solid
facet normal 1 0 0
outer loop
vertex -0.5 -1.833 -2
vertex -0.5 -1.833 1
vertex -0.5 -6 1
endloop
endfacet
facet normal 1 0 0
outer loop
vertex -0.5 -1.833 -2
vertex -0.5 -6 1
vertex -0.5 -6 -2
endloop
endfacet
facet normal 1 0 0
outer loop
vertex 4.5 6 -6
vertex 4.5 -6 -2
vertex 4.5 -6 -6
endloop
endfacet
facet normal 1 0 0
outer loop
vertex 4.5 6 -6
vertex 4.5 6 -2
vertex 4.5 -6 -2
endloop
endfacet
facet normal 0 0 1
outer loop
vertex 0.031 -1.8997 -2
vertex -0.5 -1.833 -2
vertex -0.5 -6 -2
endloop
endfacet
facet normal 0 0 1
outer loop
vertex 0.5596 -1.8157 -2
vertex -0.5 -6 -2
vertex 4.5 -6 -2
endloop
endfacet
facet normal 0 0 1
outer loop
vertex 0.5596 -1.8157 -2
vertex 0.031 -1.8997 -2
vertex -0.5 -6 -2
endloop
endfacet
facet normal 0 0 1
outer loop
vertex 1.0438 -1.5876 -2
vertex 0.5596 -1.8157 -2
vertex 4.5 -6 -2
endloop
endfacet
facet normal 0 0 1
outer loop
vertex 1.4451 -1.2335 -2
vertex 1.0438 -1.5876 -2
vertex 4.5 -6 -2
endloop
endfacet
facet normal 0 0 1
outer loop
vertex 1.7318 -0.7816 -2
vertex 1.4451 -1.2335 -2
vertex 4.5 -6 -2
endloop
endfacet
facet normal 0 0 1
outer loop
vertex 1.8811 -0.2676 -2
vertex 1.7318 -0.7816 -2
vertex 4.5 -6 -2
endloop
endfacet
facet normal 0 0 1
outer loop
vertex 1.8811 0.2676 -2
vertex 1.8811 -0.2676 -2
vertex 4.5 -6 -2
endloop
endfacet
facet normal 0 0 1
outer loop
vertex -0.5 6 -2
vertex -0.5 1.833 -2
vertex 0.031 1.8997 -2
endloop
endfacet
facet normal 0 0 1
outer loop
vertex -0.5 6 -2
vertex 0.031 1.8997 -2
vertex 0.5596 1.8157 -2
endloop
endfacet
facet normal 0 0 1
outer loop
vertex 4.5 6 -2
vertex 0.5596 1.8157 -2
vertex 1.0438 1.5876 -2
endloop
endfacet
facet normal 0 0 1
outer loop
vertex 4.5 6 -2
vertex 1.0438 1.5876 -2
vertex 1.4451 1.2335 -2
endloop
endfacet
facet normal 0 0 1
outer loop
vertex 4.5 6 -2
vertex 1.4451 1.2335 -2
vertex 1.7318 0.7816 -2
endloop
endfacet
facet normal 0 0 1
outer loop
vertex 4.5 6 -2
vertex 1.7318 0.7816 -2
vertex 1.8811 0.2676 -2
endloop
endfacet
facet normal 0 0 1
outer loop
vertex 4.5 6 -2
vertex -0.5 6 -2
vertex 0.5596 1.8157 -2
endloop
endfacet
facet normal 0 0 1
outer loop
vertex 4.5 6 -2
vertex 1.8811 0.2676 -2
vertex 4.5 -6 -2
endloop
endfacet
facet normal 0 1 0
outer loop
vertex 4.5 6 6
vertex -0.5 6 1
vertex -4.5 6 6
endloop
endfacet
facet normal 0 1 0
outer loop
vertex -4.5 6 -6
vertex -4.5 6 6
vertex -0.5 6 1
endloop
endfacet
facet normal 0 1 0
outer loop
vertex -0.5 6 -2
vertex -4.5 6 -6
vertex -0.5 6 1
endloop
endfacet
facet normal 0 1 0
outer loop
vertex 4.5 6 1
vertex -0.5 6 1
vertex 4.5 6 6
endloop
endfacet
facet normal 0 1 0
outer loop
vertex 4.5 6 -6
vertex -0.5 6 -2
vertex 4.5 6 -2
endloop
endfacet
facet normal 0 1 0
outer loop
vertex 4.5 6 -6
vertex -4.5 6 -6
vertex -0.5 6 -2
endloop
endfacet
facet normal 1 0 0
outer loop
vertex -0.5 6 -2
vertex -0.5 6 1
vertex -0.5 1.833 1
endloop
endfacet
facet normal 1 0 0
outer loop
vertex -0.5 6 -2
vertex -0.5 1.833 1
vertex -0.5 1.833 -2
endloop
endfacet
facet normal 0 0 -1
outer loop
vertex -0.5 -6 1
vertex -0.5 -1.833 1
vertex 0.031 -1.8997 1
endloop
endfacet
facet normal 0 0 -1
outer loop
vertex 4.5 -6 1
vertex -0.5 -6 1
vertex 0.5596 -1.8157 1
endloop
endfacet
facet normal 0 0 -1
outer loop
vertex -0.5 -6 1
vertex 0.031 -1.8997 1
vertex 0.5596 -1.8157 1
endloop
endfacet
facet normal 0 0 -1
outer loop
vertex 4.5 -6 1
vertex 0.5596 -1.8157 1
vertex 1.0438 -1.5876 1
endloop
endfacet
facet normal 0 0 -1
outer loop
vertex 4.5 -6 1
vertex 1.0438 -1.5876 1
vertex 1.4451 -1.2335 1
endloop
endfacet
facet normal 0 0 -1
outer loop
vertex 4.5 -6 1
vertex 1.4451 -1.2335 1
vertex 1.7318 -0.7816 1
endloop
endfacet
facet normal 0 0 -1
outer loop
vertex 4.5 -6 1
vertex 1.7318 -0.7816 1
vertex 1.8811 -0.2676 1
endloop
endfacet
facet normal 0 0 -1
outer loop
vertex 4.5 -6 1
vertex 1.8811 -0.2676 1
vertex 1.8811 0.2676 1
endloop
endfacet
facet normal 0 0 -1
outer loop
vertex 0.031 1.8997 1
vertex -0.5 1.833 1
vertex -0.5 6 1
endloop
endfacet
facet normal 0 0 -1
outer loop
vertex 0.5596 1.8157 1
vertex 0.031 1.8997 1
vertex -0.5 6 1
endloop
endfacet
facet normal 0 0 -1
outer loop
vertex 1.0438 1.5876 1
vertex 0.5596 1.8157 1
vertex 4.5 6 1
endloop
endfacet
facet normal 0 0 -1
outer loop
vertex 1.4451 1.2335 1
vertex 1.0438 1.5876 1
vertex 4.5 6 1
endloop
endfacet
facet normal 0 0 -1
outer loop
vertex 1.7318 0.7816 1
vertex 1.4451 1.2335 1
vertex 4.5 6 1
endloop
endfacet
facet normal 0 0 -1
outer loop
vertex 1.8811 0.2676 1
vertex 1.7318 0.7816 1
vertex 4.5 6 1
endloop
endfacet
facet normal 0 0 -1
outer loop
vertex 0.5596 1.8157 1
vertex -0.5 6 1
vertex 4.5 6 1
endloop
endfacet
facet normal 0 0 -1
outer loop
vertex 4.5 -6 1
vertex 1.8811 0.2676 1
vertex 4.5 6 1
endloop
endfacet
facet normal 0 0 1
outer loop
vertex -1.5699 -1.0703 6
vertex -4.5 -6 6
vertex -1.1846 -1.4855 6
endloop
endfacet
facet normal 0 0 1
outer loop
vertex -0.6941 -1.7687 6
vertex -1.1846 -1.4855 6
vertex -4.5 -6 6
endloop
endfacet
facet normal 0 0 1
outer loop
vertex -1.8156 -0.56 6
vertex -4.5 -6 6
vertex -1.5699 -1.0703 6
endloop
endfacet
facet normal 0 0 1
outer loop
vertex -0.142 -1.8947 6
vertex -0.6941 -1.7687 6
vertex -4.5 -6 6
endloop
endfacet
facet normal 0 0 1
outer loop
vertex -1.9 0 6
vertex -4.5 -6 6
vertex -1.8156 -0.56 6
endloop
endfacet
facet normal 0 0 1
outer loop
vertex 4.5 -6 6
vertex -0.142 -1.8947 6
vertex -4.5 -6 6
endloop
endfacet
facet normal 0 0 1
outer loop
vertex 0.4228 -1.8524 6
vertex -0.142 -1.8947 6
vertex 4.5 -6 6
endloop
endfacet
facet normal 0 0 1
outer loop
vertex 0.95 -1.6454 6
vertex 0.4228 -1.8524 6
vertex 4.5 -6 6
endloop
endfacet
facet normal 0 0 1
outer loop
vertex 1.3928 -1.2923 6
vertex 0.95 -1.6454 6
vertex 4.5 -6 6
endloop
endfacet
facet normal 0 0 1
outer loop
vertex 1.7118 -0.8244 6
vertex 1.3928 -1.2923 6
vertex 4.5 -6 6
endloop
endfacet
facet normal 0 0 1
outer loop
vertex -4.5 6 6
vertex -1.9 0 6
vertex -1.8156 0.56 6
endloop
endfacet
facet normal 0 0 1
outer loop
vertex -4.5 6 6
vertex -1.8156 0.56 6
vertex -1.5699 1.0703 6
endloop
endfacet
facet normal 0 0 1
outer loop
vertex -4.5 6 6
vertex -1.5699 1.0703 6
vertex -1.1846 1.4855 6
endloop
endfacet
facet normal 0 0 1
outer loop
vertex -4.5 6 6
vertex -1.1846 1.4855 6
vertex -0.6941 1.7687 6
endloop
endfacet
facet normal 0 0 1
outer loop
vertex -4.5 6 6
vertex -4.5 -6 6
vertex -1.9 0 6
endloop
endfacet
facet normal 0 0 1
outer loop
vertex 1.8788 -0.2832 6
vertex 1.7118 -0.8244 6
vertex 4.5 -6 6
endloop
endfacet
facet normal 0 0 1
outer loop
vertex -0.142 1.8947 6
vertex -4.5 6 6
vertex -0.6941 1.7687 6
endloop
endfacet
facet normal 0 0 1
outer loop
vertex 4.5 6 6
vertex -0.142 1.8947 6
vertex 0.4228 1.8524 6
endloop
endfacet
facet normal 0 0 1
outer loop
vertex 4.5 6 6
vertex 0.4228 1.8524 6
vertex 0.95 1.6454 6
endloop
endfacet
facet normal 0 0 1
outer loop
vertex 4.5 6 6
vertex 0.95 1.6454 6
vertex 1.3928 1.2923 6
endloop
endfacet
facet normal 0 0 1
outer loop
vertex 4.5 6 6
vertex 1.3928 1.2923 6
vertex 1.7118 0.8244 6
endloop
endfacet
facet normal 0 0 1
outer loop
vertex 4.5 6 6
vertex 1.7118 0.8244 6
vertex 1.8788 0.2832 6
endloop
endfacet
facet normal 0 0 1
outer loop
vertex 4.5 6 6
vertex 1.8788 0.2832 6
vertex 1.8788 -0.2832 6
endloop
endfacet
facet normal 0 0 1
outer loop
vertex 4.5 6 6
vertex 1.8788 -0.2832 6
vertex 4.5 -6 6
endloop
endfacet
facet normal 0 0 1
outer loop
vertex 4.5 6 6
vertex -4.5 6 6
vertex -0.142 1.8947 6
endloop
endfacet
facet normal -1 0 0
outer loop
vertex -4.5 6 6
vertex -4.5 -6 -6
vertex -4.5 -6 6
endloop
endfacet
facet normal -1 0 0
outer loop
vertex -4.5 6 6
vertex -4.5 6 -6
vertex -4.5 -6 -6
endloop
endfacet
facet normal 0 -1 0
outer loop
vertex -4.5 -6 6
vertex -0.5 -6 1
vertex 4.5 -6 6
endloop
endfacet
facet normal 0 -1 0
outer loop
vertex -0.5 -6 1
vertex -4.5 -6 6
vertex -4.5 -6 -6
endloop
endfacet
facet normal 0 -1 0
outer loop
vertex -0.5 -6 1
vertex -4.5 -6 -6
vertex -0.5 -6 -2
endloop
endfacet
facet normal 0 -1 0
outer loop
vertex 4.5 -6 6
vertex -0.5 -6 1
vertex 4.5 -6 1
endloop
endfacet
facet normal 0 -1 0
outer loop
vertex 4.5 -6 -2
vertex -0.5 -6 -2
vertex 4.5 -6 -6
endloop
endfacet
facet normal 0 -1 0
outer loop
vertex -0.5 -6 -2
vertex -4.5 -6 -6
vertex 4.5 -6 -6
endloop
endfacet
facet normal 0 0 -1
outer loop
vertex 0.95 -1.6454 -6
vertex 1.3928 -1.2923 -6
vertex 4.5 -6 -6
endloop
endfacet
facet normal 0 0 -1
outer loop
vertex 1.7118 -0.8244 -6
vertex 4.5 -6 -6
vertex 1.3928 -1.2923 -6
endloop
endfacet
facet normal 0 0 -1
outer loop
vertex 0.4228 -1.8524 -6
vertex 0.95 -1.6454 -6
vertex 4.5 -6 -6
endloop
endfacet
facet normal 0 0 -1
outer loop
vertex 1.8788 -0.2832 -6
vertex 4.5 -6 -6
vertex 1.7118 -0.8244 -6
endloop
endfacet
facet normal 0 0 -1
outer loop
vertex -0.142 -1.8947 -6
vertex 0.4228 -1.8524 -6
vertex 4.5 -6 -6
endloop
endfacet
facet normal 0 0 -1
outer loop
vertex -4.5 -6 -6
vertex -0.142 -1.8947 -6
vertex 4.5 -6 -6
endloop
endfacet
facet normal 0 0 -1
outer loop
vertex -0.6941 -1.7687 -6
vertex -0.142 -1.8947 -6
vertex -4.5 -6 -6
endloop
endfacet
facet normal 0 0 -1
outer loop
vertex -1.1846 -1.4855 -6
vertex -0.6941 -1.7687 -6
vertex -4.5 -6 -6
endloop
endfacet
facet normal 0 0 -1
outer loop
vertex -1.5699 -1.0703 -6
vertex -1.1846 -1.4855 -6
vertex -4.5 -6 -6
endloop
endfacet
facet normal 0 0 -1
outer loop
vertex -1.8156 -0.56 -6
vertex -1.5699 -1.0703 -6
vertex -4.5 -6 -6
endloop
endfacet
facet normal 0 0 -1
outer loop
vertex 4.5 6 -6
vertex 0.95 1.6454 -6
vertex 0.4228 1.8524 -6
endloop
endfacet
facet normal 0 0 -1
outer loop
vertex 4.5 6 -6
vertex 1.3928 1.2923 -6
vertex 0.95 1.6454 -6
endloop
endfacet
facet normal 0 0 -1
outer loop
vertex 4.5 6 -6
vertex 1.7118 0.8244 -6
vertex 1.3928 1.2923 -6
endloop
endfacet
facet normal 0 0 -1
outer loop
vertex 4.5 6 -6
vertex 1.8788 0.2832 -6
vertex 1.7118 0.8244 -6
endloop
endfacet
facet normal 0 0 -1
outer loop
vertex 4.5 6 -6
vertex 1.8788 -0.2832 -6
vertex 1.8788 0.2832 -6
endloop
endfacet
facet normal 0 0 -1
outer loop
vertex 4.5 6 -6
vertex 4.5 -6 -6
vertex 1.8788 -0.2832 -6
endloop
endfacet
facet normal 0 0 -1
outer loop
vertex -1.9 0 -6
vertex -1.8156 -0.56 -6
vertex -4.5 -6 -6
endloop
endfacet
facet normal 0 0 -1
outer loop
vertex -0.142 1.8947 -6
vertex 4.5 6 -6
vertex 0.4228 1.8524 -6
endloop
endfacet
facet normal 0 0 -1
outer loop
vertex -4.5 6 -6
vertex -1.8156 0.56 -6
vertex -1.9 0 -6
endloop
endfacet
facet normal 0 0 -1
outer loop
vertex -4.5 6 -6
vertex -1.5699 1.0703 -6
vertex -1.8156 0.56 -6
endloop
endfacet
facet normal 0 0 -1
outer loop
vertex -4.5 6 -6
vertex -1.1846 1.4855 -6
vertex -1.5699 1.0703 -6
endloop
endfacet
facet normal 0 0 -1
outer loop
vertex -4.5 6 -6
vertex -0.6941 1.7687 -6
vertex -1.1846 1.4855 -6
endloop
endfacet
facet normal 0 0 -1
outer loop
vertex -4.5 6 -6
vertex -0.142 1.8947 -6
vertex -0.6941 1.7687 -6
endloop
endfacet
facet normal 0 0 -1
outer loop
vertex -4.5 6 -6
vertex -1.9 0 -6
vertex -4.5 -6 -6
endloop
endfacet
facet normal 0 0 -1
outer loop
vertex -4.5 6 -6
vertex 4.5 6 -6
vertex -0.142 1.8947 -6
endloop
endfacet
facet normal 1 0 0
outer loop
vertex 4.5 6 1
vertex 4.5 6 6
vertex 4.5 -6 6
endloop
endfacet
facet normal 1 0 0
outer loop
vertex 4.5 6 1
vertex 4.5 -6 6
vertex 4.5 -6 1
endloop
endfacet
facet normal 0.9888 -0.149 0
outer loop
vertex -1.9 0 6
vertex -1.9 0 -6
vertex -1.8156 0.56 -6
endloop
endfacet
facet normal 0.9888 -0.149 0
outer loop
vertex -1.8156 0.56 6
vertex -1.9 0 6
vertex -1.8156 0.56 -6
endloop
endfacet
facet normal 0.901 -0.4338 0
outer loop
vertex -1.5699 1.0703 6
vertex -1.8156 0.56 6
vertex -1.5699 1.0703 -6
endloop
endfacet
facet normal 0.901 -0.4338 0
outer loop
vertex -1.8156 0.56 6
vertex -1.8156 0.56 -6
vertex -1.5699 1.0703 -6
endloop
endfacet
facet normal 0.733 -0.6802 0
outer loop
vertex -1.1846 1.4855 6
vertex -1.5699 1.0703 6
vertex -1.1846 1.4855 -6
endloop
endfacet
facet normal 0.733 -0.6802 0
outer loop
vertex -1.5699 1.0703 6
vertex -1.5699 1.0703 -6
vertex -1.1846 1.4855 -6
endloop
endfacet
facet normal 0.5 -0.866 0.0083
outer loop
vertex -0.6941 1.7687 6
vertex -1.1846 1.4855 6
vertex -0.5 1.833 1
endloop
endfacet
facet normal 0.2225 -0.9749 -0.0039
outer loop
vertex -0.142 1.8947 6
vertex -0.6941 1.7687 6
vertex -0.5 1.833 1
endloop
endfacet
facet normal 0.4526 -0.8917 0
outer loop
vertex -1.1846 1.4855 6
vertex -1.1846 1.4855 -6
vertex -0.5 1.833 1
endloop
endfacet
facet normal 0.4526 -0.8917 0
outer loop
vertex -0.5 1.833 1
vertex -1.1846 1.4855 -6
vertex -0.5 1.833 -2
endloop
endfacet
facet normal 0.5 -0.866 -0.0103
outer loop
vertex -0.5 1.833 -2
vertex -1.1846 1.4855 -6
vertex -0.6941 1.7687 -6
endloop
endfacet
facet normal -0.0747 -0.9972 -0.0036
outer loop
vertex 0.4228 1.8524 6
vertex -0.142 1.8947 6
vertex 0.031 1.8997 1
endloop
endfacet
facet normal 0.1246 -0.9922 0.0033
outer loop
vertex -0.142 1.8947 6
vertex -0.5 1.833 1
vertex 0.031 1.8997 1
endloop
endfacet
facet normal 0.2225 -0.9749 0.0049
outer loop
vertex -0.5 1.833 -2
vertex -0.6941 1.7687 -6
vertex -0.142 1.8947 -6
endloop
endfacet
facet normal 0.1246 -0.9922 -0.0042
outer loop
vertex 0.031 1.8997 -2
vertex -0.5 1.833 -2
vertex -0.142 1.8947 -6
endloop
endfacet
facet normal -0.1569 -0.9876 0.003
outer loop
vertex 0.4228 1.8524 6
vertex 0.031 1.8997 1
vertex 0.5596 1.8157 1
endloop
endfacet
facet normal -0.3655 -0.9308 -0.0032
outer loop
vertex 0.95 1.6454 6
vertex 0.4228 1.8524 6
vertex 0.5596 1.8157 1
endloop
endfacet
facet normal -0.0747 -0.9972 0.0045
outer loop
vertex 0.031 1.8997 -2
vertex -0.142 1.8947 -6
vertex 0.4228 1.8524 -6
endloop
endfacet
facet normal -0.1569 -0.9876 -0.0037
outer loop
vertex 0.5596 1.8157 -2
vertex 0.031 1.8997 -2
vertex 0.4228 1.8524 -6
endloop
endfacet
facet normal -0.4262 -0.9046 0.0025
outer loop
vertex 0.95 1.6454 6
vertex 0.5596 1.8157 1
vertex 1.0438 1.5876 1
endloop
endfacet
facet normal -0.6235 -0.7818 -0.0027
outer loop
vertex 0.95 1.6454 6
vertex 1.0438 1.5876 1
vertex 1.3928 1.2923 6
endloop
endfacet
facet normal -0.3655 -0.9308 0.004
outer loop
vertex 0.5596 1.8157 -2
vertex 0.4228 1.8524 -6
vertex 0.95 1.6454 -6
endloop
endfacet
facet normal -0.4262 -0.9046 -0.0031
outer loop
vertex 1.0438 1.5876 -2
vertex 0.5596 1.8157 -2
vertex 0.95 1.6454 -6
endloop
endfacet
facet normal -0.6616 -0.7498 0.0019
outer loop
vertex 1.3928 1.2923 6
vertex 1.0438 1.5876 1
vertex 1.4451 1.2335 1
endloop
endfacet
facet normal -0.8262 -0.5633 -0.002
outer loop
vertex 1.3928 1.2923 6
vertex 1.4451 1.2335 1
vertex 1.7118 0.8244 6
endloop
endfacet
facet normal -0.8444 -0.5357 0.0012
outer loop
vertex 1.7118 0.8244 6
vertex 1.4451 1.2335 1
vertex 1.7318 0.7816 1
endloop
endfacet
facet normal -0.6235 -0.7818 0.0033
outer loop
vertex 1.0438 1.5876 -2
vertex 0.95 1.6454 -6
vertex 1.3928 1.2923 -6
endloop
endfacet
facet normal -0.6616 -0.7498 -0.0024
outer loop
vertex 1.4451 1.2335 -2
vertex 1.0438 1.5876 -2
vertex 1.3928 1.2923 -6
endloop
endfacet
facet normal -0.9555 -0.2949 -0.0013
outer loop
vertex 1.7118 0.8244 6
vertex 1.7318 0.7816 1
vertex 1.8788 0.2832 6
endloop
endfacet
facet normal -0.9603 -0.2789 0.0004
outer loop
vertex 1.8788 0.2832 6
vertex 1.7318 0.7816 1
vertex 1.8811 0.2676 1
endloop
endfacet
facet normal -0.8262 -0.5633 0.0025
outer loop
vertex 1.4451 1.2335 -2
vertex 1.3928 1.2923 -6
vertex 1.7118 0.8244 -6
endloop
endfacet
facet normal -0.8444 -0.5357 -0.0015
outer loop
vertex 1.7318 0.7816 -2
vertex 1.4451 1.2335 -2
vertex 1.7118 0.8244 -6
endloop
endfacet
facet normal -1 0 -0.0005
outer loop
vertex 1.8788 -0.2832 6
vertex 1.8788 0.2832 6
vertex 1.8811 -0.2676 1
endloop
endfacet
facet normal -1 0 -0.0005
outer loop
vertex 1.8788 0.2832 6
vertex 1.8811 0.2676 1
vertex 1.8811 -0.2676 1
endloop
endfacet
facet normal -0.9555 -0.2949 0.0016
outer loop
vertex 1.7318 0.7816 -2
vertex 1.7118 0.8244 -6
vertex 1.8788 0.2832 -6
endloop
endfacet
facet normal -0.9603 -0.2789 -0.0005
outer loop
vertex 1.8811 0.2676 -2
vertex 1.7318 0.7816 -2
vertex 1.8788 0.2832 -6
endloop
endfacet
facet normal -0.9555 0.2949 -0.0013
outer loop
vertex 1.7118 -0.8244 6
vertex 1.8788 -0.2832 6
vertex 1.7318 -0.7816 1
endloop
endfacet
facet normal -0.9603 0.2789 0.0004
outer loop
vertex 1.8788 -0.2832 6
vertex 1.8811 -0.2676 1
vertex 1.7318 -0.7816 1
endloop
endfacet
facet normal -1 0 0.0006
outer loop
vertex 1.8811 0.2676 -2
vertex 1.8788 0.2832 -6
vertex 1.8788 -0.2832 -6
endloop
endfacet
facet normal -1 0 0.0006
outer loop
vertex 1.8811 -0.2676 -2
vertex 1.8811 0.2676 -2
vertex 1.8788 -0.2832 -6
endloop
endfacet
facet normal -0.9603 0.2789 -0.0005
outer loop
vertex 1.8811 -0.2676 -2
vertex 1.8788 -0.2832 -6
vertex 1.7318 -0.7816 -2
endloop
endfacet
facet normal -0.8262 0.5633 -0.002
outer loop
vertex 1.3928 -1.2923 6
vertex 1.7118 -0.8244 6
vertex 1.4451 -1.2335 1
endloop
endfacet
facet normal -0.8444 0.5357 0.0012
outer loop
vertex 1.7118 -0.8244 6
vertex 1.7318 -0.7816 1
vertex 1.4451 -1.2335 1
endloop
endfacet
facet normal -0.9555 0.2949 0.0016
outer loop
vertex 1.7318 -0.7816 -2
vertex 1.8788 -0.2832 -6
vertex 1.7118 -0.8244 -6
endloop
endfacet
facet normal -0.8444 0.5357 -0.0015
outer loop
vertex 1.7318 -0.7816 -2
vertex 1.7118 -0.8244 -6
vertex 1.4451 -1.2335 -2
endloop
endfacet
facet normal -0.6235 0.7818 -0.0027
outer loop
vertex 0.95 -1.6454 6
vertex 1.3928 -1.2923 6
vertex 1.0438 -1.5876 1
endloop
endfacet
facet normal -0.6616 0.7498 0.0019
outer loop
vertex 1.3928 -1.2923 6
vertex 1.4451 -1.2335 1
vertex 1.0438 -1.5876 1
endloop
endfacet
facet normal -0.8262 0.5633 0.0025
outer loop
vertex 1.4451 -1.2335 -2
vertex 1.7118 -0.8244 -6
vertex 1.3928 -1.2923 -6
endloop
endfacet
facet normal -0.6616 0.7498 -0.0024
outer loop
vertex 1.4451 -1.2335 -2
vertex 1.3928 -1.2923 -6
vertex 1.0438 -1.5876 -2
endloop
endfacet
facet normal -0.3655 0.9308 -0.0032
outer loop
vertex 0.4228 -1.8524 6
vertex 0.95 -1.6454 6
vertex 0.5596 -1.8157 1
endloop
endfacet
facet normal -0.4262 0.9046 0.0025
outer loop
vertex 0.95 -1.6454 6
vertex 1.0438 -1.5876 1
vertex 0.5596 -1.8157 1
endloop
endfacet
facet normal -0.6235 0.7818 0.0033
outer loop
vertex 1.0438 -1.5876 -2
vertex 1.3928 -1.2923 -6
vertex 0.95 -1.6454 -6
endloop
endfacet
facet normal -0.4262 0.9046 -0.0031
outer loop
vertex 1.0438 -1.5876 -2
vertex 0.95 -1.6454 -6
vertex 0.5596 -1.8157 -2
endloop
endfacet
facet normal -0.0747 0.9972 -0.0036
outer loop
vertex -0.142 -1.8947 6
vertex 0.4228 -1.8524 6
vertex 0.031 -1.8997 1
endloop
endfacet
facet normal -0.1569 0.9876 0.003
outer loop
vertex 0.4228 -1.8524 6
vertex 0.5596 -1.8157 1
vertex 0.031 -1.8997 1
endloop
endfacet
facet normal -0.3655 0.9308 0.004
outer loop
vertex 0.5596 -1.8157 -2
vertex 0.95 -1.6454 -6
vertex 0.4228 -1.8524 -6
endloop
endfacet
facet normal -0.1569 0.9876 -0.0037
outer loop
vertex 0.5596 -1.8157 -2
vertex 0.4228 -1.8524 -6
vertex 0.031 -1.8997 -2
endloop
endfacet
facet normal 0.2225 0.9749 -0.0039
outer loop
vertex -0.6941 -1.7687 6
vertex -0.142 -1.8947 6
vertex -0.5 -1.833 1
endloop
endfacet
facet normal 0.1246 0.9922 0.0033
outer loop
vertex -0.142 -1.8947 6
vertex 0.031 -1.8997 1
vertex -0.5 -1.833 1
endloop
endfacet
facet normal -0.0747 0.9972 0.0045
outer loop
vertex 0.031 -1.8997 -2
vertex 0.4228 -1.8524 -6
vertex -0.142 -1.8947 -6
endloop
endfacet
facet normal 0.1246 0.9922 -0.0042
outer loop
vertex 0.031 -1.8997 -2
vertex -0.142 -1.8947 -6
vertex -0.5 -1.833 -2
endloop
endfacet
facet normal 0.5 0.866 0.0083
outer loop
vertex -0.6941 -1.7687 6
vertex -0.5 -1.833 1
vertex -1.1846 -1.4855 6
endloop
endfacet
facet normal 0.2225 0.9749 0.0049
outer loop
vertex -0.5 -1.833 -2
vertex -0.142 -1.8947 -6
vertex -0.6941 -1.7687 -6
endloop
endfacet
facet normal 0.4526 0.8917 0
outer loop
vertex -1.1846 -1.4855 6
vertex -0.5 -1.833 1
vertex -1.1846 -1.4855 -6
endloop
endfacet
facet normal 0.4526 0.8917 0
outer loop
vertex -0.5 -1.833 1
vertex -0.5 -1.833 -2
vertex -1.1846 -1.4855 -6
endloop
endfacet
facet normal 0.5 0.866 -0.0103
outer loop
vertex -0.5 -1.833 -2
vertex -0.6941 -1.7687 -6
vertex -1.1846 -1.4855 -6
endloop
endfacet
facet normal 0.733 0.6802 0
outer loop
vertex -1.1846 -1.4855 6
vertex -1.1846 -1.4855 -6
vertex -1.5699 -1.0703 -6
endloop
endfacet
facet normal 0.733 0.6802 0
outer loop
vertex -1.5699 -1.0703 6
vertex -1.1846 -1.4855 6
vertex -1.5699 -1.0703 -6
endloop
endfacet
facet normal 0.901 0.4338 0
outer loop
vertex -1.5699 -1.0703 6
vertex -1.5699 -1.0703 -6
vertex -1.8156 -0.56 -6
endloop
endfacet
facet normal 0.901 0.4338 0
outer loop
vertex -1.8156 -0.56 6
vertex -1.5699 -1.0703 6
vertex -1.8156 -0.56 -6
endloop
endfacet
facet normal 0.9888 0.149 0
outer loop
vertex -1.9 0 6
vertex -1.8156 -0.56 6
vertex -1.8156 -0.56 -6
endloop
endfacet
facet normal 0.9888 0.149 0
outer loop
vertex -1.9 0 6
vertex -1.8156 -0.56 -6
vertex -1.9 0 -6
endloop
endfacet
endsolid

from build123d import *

# Parameters (mm, degrees)
SKETCH1_W           = 5
SKETCH1_H           = 5
BOSS_EXTRUDE2_DEPTH = 6
SKETCH2_R           = 1.9
CUT_EXTRUDE1_DEPTH  = 13


with BuildPart() as part:
    # Sketch1 → Boss-Extrude2 (new body, symmetric)
    with BuildSketch(Plane(origin=(0, 0, 0), x_dir=(1, 0, 0), z_dir=(0, 1, 0))):
        Polygon((-4.5, 6), (-4.5, -6), (-0.5, -6), (-0.5, -1), (-0.5, 2), (4.5, 2), (4.5, 6), align=None)
        with Locations((2, -3.5)):
            Rectangle(SKETCH1_W, SKETCH1_H)
    extrude(amount=BOSS_EXTRUDE2_DEPTH, both=True)

    # Sketch2 → Cut-Extrude1 (cut, through all)
    with BuildSketch(Plane(origin=(0, 0, -6), x_dir=(-1, 0, 0), z_dir=(0, 0, -1))):
        Circle(SKETCH2_R)
    extrude(amount=-CUT_EXTRUDE1_DEPTH, mode=Mode.SUBTRACT)


solid = part.part
